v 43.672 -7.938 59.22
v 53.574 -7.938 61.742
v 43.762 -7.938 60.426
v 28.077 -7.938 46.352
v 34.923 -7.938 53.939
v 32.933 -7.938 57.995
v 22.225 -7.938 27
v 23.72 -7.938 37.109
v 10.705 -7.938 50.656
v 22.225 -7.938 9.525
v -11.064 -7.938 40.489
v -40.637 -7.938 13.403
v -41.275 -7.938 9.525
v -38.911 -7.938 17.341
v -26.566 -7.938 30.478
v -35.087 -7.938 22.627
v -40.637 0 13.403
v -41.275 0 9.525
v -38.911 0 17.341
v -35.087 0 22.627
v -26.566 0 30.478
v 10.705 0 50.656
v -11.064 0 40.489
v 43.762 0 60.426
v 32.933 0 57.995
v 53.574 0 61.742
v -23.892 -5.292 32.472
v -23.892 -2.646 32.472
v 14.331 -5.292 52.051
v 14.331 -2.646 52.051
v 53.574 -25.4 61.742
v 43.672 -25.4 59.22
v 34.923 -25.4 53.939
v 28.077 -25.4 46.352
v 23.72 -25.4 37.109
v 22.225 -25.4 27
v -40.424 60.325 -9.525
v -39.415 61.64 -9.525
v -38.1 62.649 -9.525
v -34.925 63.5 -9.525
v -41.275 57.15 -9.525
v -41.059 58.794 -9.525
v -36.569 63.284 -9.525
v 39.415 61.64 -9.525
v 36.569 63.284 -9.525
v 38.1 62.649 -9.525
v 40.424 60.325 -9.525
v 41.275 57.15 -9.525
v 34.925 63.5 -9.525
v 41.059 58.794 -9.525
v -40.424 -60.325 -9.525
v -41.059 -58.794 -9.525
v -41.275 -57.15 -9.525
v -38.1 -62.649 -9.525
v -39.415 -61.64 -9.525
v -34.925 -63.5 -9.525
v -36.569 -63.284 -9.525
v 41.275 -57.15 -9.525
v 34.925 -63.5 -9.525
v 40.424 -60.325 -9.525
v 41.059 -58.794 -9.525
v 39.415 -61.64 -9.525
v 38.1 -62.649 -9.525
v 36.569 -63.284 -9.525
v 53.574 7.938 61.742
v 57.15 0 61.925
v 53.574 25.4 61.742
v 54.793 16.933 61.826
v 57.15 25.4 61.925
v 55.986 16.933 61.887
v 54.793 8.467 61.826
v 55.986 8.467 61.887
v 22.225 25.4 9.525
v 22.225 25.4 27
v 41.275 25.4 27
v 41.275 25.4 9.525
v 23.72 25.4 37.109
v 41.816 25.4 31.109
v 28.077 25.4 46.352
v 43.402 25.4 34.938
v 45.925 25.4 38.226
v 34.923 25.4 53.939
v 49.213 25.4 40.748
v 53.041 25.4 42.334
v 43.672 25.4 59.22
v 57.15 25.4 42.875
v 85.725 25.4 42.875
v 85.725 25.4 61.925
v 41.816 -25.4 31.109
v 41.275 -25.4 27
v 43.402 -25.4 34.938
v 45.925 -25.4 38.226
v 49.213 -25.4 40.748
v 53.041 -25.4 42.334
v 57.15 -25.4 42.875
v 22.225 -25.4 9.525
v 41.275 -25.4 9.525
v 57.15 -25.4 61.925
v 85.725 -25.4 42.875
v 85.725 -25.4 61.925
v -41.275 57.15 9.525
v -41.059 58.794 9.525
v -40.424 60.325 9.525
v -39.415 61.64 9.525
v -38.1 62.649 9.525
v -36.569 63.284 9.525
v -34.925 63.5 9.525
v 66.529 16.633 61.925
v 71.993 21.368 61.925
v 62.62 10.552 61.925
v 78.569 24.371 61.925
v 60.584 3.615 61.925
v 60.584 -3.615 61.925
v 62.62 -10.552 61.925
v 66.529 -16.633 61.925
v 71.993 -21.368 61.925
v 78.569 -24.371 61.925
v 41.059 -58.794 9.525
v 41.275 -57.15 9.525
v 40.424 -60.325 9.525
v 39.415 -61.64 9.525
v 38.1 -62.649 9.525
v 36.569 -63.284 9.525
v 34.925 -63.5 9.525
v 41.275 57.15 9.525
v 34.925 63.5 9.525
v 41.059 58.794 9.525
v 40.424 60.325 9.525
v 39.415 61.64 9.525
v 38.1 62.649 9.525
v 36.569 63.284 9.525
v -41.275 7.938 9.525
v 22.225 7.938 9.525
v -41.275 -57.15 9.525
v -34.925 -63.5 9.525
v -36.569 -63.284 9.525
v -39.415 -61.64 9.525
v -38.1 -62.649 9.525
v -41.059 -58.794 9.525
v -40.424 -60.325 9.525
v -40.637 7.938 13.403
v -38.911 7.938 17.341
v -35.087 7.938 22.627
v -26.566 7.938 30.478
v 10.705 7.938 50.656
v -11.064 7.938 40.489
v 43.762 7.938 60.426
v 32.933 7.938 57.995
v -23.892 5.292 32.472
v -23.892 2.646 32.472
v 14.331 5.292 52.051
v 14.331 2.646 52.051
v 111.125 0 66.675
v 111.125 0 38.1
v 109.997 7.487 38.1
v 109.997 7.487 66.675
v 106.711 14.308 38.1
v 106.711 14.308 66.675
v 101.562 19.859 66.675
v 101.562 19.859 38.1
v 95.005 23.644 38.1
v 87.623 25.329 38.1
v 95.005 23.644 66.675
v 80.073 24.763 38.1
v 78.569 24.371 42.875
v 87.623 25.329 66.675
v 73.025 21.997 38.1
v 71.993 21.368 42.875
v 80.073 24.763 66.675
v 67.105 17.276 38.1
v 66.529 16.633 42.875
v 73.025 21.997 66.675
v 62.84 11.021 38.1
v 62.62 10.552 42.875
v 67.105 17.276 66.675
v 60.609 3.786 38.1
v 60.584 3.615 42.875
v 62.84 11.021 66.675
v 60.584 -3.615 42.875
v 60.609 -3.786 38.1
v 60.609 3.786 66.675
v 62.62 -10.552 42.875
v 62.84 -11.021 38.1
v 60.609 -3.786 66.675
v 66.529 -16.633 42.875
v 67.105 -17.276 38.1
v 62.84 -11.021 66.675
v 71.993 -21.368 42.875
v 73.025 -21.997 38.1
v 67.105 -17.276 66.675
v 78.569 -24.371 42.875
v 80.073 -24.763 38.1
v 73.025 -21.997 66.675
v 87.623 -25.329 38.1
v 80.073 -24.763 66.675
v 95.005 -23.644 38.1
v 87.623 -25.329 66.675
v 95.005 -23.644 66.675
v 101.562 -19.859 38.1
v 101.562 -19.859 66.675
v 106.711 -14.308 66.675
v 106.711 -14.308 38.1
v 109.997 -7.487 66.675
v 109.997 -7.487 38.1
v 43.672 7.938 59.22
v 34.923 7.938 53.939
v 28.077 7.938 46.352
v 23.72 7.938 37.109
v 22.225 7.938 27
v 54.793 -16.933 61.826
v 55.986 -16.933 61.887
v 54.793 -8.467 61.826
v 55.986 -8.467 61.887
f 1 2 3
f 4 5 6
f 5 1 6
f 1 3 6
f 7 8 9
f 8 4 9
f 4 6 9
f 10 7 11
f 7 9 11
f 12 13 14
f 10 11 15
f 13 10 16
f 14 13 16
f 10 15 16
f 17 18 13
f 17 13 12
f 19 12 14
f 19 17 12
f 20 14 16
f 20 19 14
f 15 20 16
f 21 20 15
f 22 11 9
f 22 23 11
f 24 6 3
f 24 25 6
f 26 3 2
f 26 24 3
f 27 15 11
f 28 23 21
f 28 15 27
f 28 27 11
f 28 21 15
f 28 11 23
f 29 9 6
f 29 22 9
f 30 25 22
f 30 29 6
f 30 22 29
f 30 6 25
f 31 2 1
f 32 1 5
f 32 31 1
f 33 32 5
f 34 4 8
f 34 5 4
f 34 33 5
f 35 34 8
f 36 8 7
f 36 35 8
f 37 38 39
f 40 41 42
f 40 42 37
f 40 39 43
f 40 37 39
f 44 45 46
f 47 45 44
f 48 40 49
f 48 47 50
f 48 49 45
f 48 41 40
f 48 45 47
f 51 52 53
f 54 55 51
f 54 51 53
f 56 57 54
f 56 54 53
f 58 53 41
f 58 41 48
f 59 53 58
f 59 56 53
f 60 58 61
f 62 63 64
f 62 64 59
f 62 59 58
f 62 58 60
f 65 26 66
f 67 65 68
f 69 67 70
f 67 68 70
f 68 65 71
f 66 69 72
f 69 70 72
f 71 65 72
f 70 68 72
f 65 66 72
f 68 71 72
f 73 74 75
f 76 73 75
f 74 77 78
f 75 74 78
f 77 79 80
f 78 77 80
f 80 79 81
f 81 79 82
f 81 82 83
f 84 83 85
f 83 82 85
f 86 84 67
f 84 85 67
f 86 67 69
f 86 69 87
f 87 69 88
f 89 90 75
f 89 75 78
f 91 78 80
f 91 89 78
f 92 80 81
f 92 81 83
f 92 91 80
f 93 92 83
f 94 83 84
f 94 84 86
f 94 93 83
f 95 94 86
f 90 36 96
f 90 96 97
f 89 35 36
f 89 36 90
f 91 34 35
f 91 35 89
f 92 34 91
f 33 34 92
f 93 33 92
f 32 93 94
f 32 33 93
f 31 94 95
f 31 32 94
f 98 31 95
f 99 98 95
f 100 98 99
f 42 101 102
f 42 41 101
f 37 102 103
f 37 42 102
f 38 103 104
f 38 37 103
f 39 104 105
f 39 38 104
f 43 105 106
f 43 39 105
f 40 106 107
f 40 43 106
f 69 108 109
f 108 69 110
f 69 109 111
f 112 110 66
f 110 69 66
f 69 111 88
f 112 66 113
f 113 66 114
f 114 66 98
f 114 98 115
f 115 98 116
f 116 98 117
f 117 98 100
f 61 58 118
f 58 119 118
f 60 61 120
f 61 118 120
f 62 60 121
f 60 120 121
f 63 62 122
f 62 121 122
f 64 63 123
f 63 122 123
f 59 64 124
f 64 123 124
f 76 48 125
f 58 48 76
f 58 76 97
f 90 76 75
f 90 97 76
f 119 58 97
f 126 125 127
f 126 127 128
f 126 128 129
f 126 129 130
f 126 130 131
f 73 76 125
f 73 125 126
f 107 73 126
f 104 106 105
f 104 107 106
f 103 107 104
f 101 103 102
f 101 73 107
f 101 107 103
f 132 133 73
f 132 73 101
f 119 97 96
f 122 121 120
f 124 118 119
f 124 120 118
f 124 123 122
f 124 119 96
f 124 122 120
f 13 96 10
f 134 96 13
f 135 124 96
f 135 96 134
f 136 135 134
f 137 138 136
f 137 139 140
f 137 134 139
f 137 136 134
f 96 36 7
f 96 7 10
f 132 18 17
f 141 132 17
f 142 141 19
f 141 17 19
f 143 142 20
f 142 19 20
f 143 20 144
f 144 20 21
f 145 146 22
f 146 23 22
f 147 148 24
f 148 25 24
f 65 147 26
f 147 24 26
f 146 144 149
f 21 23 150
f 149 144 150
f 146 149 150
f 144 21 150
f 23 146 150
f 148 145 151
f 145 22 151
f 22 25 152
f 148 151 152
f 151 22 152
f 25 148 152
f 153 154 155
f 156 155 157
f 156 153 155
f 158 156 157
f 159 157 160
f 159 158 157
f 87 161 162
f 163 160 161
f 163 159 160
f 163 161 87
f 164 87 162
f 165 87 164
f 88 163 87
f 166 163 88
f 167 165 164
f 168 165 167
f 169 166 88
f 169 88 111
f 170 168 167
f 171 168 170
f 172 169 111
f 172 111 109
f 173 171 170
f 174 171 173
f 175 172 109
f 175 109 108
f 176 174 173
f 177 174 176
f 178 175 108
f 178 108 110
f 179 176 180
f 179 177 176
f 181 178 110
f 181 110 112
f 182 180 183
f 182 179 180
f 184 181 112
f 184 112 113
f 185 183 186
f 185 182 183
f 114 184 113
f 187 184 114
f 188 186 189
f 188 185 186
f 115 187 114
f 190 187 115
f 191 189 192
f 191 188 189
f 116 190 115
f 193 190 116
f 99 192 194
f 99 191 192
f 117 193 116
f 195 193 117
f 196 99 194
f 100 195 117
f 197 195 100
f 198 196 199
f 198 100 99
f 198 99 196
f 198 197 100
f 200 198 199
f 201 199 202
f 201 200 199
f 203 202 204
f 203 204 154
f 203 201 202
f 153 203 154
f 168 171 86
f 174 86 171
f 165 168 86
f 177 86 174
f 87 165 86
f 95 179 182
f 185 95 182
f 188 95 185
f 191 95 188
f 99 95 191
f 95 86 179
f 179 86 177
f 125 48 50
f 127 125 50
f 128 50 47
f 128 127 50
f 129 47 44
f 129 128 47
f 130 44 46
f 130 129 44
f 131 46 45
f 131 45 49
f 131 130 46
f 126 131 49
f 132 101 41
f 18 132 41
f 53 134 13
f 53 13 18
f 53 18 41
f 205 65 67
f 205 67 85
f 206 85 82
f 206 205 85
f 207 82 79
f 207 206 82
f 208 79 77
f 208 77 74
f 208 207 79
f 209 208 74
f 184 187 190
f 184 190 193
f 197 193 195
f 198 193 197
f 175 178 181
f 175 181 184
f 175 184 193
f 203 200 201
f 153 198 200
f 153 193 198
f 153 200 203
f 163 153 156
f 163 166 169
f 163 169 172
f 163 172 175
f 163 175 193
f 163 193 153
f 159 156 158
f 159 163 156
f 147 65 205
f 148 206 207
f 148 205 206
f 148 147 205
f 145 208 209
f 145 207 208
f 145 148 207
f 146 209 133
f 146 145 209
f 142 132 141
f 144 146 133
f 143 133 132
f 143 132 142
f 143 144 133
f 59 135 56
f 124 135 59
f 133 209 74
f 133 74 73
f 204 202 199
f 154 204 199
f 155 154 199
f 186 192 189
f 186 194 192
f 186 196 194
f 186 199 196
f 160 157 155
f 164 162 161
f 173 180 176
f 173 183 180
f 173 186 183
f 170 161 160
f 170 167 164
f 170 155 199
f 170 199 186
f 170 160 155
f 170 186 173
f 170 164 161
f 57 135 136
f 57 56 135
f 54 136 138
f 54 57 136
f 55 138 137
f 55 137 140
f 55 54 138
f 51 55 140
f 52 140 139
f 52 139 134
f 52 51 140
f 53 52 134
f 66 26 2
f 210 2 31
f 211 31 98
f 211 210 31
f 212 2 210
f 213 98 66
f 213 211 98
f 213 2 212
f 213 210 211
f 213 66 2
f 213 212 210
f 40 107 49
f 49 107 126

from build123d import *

# Parameters (mm, degrees)
F1_DEPTH = 63.5
F2_DEPTH = 25.4
F0_W     = 25.4
F0_H     = 19.05
F3_DEPTH = 25.4
F4_DEPTH = 7.9375
F6_R     = 6.35


with BuildPart() as f1:
    # F0 (on Front) → F1 (new body, symmetric)
    with BuildSketch(Plane.XZ):
        Polygon((-41.275, 9.525), (-41.275, -9.525), (41.275, -9.525), (41.275, 9.525), (22.225, 9.525), align=None)
    extrude(amount=F1_DEPTH, both=True)

    # F0 (on Front) → F2 (join, symmetric)
    with BuildSketch(Plane.XZ):
        with BuildLine():
            Line((22.225, 9.525), (41.275, 9.525))
            Line((41.275, 9.525), (41.275, 27.0002))
            ThreePointArc((41.275, 27.0002), (45.9246798487, 38.2255201513), (57.15, 42.8752))
            Line((57.15, 42.8752), (60.325, 42.8752))
            Line((60.325, 42.8752), (60.325, 61.9252))
            Line((60.325, 61.9252), (57.15, 61.9252))
            add(Edge.make_bspline(
                [(53.5742223952, 61.7416657077), (54.8066544525, 61.8373665684), (56.0001082359, 61.8990472552), (57.15, 61.9252)],
                knots=[107.5074121299, 107.5074121299, 107.5074121299, 107.5074121299, 111.5045361635, 111.5045361635, 111.5045361635, 111.5045361635], degree=3))
            ThreePointArc((53.5742223952, 61.7416657077), (31.2208691059, 50.3975459195), (22.225, 27.0002))
            Line((22.225, 27.0002), (22.225, 9.525))
        make_face()
    extrude(amount=F2_DEPTH, both=True)

    # F0 (on Front) → F3 (join, symmetric)
    with BuildSketch(Plane.XZ):
        with Locations((73.025, 52.4002)):
            Rectangle(F0_W, F0_H)
    extrude(amount=F3_DEPTH, both=True)

    # F0 (on Front) → F4 (join, symmetric)
    with BuildSketch(Plane.XZ):
        with BuildLine():
            add(Edge.make_bspline(
                [(-41.275, 9.525), (-40.9183161587, 31.9833210844), (20.4264941805, 59.1676770631), (53.5742223952, 61.7416657077)],
                knots=[0, 0, 0, 0, 107.5074121299, 107.5074121299, 107.5074121299, 107.5074121299], degree=3))
            Line((-41.275, 9.525), (22.225, 9.525))
            Line((22.225, 9.525), (22.225, 27.0002))
            ThreePointArc((22.225, 27.0002), (31.2208691059, 50.3975459195), (53.5742223952, 61.7416657077))
        make_face()
    extrude(amount=F4_DEPTH, both=True)

    # F0 (on Front) → F5 (revolve)
    with BuildSketch(Plane.XZ):
        Polygon((85.725, 66.675), (85.725, 61.9252), (85.725, 42.8752), (85.725, 38.1), (111.125, 38.1), (111.125, 66.675), align=None)
    revolve(axis=Axis((85.725, 0, 52.3875), (0, 0, 1)))

    # F6
    f6_edges = [f1.edges().sort_by_distance(p)[0] for p in [
        (-41.275, -63.5, 0),
        (41.275, -63.5, 0),
        (-41.275, 63.5, 0),
        (41.275, 63.5, 0),
    ]]
    fillet(f6_edges, radius=F6_R)


solid = f1.part
